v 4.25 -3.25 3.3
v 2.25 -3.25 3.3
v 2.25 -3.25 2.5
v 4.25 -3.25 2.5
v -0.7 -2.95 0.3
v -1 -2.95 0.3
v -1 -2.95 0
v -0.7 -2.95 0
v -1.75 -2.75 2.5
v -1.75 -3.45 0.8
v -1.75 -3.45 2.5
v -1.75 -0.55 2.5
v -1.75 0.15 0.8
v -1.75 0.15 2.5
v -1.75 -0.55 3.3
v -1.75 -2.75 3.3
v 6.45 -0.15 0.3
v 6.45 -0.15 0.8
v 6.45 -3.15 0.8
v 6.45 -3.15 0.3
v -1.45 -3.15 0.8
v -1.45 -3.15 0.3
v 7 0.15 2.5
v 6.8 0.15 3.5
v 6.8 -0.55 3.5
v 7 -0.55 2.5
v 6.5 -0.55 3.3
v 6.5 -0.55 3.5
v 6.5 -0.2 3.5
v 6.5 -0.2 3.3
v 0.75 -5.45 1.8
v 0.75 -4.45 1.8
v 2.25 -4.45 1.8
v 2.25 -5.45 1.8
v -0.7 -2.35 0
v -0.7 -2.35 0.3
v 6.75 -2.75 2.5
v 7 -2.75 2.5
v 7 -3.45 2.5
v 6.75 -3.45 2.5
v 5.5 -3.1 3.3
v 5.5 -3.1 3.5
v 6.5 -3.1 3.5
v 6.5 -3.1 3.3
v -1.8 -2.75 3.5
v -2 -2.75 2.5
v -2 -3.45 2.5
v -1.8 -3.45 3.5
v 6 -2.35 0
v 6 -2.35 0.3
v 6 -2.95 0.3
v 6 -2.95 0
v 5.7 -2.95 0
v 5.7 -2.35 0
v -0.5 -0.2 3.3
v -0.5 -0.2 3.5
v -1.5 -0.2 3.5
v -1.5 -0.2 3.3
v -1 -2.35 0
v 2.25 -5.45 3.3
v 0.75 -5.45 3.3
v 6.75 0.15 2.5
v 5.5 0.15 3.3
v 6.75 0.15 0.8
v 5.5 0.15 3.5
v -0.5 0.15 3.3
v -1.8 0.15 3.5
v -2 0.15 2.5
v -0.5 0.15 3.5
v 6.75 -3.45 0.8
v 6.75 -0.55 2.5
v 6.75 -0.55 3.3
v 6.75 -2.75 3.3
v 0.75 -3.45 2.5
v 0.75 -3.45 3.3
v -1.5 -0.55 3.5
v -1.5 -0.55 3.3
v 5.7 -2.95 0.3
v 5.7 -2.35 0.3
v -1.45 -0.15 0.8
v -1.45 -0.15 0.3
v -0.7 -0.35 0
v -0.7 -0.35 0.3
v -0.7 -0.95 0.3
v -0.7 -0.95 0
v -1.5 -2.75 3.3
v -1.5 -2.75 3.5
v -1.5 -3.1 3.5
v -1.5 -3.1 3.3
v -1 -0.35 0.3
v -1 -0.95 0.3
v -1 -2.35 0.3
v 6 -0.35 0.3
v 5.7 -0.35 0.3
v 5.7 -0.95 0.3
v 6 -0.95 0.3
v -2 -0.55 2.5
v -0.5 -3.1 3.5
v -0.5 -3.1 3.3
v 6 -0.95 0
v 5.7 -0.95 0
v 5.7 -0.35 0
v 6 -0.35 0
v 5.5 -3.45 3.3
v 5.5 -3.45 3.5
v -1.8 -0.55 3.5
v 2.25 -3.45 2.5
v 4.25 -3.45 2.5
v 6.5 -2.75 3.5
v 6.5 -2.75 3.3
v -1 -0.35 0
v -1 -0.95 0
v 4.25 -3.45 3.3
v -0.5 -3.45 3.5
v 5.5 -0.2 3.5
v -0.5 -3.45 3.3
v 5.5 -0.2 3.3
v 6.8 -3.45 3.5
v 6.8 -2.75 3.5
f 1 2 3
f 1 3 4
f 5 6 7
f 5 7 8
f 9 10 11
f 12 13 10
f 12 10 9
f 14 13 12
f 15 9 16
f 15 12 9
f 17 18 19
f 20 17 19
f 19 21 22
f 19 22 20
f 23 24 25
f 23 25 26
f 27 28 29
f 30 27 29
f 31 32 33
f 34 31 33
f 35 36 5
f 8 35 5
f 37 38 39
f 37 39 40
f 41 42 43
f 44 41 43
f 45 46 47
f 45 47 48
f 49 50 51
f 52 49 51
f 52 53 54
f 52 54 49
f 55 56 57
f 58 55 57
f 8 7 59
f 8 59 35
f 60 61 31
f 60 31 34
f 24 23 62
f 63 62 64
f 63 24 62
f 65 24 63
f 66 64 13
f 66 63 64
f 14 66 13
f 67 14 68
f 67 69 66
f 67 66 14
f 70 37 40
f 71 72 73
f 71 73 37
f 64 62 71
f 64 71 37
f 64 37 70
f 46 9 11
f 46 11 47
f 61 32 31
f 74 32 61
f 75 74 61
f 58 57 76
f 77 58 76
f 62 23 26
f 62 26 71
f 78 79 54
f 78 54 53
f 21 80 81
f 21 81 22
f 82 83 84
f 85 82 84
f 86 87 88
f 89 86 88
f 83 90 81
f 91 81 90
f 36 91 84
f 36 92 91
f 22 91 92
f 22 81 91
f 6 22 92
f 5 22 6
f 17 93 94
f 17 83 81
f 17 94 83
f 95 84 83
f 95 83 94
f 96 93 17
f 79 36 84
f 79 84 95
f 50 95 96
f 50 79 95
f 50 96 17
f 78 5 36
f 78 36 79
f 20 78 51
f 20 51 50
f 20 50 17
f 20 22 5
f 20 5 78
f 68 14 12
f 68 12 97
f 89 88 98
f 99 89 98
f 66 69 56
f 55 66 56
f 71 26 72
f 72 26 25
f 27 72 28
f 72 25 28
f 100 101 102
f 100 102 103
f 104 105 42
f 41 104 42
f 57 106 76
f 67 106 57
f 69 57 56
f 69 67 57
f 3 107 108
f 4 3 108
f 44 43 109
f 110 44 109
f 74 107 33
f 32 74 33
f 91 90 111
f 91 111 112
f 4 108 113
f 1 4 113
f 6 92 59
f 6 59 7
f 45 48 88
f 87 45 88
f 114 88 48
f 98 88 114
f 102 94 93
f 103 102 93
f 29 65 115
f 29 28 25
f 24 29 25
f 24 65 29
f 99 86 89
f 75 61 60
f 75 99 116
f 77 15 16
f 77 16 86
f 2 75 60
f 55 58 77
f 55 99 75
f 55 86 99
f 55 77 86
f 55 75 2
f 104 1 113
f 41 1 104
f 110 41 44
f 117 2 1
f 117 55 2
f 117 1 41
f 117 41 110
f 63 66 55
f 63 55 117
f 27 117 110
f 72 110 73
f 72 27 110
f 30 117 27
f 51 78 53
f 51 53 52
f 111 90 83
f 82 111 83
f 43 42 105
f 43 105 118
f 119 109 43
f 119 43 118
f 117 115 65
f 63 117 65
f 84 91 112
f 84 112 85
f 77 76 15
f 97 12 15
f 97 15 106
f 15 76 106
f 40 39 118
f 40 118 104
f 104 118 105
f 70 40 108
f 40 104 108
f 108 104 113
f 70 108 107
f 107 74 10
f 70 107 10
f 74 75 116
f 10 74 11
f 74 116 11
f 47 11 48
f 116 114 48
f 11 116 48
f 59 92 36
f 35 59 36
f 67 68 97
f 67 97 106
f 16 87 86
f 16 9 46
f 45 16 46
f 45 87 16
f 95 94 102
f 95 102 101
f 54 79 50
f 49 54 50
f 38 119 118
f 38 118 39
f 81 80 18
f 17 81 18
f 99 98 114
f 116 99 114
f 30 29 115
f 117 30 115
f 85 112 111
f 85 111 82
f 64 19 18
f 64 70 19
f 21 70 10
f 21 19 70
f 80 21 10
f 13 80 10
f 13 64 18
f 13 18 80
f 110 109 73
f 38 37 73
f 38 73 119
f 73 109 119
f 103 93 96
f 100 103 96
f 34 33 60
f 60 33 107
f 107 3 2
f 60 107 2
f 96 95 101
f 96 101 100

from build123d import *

# Parameters (mm, degrees)
PAD_DEPTH       = 3.6
SKETCH001_W     = 7.9
SKETCH001_H     = 3
PAD001_DEPTH    = 0.5
SKETCH002_W     = 0.3
SKETCH002_H     = 0.6
PAD002_DEPTH    = 0.3
SKETCH003_W     = 0.25
SKETCH003_H     = 2.2
POCKET_DEPTH    = 3.501
POCKET001_DEPTH = 0.2
SKETCH014_W     = 3.5
SKETCH014_H     = 0.8
POCKET002_DEPTH = 0.2
SKETCH015_W     = 1.5
SKETCH015_H     = 1.5
PAD008_DEPTH    = 2.2
POCKET003_DEPTH = 4.251


with BuildPart() as part:
    # Sketch (on DatumPlane) → Pad (new body)
    with BuildSketch(Plane.XZ.offset(-0.15)):
        Polygon((-1.75, 0.8), (-1.75, 2.5), (-2, 2.5), (-1.8, 3.5), (6.8, 3.5), (7, 2.5), (6.75, 2.5), (6.75, 0.8), align=None)
    extrude(amount=PAD_DEPTH)

    # Sketch001 (on Face8 of Pad) → Pad001 (join)
    with BuildSketch(Plane(origin=(0, 0.15, 0.8), x_dir=(1, 0, 0), z_dir=(0, 0, -1))):
        with Locations((2.5, 1.8)):
            Rectangle(SKETCH001_W, SKETCH001_H)
    extrude(amount=PAD001_DEPTH)

    # Sketch002 (on Face15 of Pad001) → Pad002 (join)
    with BuildSketch(Plane(origin=(0, 0.15, 0.3), x_dir=(1, 0, 0), z_dir=(0, 0, -1))):
        with Locations((-0.85, 2.8)):
            Rectangle(SKETCH002_W, SKETCH002_H)
        with Locations((-0.85, 0.8)):
            Rectangle(SKETCH002_W, SKETCH002_H)
        with Locations((5.85, 2.8)):
            Rectangle(SKETCH002_W, SKETCH002_H)
        with Locations((5.85, 0.8)):
            Rectangle(SKETCH002_W, SKETCH002_H)
    extrude(amount=PAD002_DEPTH)

    # Sketch003 (on Face12 of Pad002) → Pocket (cut, through all)
    with BuildSketch(Plane(origin=(0, 0.15, 3.5), x_dir=(-1, 0, 0), z_dir=(0, 0, 1))):
        with Locations((1.875, 1.8)):
            Rectangle(SKETCH003_W, SKETCH003_H)
        with Locations((-6.875, 1.8)):
            Rectangle(SKETCH003_W, SKETCH003_H)
    extrude(amount=-POCKET_DEPTH, mode=Mode.SUBTRACT)

    # Sketch004 (on Face7 of Pocket) → Pocket001 (cut)
    with BuildSketch(Plane(origin=(0, 0.15, 3.5), x_dir=(-1, 0, 0), z_dir=(0, 0, 1))):
        Polygon((-5.5, 3.6), (-5.5, 3.25), (-6.5, 3.25), (-6.5, 2.9), (-6.75, 2.9), (-6.75, 0.7), (-6.5, 0.7), (-6.5, 0.35), (-5.5, 0.35), (-5.5, 0), (0.5, 0), (0.5, 0.35), (1.5, 0.35), (1.5, 0.7), (1.75, 0.7), (1.75, 2.9), (1.5, 2.9), (1.5, 3.25), (0.5, 3.25), (0.5, 3.6), align=None)
    extrude(amount=-POCKET001_DEPTH, mode=Mode.SUBTRACT)

    # Sketch014 (on Face20 of Pocket001) → Pocket002 (cut)
    with BuildSketch(Plane.XZ.offset(3.45)):
        with Locations((2.5, 2.9)):
            Rectangle(SKETCH014_W, SKETCH014_H)
    extrude(amount=-POCKET002_DEPTH, mode=Mode.SUBTRACT)

    # Sketch015 (on Face40 of Pocket002) → Pad008 (join)
    with BuildSketch(Plane.XZ.offset(3.25)):
        with Locations((1.5, 2.55)):
            Rectangle(SKETCH015_W, SKETCH015_H)
    extrude(amount=PAD008_DEPTH)

    # Sketch016 (on Face50 of Pad008) → Pocket003 (cut, through all)
    with BuildSketch(Plane(origin=(2.25, 0.15, 0), x_dir=(0, 0, 1), z_dir=(1, 0, 0))):
        Polygon((1.8, 4.6), (1.8, 3.6), (2.5, 3.6), align=None)
    extrude(amount=-POCKET003_DEPTH, mode=Mode.SUBTRACT)


solid = part.part
